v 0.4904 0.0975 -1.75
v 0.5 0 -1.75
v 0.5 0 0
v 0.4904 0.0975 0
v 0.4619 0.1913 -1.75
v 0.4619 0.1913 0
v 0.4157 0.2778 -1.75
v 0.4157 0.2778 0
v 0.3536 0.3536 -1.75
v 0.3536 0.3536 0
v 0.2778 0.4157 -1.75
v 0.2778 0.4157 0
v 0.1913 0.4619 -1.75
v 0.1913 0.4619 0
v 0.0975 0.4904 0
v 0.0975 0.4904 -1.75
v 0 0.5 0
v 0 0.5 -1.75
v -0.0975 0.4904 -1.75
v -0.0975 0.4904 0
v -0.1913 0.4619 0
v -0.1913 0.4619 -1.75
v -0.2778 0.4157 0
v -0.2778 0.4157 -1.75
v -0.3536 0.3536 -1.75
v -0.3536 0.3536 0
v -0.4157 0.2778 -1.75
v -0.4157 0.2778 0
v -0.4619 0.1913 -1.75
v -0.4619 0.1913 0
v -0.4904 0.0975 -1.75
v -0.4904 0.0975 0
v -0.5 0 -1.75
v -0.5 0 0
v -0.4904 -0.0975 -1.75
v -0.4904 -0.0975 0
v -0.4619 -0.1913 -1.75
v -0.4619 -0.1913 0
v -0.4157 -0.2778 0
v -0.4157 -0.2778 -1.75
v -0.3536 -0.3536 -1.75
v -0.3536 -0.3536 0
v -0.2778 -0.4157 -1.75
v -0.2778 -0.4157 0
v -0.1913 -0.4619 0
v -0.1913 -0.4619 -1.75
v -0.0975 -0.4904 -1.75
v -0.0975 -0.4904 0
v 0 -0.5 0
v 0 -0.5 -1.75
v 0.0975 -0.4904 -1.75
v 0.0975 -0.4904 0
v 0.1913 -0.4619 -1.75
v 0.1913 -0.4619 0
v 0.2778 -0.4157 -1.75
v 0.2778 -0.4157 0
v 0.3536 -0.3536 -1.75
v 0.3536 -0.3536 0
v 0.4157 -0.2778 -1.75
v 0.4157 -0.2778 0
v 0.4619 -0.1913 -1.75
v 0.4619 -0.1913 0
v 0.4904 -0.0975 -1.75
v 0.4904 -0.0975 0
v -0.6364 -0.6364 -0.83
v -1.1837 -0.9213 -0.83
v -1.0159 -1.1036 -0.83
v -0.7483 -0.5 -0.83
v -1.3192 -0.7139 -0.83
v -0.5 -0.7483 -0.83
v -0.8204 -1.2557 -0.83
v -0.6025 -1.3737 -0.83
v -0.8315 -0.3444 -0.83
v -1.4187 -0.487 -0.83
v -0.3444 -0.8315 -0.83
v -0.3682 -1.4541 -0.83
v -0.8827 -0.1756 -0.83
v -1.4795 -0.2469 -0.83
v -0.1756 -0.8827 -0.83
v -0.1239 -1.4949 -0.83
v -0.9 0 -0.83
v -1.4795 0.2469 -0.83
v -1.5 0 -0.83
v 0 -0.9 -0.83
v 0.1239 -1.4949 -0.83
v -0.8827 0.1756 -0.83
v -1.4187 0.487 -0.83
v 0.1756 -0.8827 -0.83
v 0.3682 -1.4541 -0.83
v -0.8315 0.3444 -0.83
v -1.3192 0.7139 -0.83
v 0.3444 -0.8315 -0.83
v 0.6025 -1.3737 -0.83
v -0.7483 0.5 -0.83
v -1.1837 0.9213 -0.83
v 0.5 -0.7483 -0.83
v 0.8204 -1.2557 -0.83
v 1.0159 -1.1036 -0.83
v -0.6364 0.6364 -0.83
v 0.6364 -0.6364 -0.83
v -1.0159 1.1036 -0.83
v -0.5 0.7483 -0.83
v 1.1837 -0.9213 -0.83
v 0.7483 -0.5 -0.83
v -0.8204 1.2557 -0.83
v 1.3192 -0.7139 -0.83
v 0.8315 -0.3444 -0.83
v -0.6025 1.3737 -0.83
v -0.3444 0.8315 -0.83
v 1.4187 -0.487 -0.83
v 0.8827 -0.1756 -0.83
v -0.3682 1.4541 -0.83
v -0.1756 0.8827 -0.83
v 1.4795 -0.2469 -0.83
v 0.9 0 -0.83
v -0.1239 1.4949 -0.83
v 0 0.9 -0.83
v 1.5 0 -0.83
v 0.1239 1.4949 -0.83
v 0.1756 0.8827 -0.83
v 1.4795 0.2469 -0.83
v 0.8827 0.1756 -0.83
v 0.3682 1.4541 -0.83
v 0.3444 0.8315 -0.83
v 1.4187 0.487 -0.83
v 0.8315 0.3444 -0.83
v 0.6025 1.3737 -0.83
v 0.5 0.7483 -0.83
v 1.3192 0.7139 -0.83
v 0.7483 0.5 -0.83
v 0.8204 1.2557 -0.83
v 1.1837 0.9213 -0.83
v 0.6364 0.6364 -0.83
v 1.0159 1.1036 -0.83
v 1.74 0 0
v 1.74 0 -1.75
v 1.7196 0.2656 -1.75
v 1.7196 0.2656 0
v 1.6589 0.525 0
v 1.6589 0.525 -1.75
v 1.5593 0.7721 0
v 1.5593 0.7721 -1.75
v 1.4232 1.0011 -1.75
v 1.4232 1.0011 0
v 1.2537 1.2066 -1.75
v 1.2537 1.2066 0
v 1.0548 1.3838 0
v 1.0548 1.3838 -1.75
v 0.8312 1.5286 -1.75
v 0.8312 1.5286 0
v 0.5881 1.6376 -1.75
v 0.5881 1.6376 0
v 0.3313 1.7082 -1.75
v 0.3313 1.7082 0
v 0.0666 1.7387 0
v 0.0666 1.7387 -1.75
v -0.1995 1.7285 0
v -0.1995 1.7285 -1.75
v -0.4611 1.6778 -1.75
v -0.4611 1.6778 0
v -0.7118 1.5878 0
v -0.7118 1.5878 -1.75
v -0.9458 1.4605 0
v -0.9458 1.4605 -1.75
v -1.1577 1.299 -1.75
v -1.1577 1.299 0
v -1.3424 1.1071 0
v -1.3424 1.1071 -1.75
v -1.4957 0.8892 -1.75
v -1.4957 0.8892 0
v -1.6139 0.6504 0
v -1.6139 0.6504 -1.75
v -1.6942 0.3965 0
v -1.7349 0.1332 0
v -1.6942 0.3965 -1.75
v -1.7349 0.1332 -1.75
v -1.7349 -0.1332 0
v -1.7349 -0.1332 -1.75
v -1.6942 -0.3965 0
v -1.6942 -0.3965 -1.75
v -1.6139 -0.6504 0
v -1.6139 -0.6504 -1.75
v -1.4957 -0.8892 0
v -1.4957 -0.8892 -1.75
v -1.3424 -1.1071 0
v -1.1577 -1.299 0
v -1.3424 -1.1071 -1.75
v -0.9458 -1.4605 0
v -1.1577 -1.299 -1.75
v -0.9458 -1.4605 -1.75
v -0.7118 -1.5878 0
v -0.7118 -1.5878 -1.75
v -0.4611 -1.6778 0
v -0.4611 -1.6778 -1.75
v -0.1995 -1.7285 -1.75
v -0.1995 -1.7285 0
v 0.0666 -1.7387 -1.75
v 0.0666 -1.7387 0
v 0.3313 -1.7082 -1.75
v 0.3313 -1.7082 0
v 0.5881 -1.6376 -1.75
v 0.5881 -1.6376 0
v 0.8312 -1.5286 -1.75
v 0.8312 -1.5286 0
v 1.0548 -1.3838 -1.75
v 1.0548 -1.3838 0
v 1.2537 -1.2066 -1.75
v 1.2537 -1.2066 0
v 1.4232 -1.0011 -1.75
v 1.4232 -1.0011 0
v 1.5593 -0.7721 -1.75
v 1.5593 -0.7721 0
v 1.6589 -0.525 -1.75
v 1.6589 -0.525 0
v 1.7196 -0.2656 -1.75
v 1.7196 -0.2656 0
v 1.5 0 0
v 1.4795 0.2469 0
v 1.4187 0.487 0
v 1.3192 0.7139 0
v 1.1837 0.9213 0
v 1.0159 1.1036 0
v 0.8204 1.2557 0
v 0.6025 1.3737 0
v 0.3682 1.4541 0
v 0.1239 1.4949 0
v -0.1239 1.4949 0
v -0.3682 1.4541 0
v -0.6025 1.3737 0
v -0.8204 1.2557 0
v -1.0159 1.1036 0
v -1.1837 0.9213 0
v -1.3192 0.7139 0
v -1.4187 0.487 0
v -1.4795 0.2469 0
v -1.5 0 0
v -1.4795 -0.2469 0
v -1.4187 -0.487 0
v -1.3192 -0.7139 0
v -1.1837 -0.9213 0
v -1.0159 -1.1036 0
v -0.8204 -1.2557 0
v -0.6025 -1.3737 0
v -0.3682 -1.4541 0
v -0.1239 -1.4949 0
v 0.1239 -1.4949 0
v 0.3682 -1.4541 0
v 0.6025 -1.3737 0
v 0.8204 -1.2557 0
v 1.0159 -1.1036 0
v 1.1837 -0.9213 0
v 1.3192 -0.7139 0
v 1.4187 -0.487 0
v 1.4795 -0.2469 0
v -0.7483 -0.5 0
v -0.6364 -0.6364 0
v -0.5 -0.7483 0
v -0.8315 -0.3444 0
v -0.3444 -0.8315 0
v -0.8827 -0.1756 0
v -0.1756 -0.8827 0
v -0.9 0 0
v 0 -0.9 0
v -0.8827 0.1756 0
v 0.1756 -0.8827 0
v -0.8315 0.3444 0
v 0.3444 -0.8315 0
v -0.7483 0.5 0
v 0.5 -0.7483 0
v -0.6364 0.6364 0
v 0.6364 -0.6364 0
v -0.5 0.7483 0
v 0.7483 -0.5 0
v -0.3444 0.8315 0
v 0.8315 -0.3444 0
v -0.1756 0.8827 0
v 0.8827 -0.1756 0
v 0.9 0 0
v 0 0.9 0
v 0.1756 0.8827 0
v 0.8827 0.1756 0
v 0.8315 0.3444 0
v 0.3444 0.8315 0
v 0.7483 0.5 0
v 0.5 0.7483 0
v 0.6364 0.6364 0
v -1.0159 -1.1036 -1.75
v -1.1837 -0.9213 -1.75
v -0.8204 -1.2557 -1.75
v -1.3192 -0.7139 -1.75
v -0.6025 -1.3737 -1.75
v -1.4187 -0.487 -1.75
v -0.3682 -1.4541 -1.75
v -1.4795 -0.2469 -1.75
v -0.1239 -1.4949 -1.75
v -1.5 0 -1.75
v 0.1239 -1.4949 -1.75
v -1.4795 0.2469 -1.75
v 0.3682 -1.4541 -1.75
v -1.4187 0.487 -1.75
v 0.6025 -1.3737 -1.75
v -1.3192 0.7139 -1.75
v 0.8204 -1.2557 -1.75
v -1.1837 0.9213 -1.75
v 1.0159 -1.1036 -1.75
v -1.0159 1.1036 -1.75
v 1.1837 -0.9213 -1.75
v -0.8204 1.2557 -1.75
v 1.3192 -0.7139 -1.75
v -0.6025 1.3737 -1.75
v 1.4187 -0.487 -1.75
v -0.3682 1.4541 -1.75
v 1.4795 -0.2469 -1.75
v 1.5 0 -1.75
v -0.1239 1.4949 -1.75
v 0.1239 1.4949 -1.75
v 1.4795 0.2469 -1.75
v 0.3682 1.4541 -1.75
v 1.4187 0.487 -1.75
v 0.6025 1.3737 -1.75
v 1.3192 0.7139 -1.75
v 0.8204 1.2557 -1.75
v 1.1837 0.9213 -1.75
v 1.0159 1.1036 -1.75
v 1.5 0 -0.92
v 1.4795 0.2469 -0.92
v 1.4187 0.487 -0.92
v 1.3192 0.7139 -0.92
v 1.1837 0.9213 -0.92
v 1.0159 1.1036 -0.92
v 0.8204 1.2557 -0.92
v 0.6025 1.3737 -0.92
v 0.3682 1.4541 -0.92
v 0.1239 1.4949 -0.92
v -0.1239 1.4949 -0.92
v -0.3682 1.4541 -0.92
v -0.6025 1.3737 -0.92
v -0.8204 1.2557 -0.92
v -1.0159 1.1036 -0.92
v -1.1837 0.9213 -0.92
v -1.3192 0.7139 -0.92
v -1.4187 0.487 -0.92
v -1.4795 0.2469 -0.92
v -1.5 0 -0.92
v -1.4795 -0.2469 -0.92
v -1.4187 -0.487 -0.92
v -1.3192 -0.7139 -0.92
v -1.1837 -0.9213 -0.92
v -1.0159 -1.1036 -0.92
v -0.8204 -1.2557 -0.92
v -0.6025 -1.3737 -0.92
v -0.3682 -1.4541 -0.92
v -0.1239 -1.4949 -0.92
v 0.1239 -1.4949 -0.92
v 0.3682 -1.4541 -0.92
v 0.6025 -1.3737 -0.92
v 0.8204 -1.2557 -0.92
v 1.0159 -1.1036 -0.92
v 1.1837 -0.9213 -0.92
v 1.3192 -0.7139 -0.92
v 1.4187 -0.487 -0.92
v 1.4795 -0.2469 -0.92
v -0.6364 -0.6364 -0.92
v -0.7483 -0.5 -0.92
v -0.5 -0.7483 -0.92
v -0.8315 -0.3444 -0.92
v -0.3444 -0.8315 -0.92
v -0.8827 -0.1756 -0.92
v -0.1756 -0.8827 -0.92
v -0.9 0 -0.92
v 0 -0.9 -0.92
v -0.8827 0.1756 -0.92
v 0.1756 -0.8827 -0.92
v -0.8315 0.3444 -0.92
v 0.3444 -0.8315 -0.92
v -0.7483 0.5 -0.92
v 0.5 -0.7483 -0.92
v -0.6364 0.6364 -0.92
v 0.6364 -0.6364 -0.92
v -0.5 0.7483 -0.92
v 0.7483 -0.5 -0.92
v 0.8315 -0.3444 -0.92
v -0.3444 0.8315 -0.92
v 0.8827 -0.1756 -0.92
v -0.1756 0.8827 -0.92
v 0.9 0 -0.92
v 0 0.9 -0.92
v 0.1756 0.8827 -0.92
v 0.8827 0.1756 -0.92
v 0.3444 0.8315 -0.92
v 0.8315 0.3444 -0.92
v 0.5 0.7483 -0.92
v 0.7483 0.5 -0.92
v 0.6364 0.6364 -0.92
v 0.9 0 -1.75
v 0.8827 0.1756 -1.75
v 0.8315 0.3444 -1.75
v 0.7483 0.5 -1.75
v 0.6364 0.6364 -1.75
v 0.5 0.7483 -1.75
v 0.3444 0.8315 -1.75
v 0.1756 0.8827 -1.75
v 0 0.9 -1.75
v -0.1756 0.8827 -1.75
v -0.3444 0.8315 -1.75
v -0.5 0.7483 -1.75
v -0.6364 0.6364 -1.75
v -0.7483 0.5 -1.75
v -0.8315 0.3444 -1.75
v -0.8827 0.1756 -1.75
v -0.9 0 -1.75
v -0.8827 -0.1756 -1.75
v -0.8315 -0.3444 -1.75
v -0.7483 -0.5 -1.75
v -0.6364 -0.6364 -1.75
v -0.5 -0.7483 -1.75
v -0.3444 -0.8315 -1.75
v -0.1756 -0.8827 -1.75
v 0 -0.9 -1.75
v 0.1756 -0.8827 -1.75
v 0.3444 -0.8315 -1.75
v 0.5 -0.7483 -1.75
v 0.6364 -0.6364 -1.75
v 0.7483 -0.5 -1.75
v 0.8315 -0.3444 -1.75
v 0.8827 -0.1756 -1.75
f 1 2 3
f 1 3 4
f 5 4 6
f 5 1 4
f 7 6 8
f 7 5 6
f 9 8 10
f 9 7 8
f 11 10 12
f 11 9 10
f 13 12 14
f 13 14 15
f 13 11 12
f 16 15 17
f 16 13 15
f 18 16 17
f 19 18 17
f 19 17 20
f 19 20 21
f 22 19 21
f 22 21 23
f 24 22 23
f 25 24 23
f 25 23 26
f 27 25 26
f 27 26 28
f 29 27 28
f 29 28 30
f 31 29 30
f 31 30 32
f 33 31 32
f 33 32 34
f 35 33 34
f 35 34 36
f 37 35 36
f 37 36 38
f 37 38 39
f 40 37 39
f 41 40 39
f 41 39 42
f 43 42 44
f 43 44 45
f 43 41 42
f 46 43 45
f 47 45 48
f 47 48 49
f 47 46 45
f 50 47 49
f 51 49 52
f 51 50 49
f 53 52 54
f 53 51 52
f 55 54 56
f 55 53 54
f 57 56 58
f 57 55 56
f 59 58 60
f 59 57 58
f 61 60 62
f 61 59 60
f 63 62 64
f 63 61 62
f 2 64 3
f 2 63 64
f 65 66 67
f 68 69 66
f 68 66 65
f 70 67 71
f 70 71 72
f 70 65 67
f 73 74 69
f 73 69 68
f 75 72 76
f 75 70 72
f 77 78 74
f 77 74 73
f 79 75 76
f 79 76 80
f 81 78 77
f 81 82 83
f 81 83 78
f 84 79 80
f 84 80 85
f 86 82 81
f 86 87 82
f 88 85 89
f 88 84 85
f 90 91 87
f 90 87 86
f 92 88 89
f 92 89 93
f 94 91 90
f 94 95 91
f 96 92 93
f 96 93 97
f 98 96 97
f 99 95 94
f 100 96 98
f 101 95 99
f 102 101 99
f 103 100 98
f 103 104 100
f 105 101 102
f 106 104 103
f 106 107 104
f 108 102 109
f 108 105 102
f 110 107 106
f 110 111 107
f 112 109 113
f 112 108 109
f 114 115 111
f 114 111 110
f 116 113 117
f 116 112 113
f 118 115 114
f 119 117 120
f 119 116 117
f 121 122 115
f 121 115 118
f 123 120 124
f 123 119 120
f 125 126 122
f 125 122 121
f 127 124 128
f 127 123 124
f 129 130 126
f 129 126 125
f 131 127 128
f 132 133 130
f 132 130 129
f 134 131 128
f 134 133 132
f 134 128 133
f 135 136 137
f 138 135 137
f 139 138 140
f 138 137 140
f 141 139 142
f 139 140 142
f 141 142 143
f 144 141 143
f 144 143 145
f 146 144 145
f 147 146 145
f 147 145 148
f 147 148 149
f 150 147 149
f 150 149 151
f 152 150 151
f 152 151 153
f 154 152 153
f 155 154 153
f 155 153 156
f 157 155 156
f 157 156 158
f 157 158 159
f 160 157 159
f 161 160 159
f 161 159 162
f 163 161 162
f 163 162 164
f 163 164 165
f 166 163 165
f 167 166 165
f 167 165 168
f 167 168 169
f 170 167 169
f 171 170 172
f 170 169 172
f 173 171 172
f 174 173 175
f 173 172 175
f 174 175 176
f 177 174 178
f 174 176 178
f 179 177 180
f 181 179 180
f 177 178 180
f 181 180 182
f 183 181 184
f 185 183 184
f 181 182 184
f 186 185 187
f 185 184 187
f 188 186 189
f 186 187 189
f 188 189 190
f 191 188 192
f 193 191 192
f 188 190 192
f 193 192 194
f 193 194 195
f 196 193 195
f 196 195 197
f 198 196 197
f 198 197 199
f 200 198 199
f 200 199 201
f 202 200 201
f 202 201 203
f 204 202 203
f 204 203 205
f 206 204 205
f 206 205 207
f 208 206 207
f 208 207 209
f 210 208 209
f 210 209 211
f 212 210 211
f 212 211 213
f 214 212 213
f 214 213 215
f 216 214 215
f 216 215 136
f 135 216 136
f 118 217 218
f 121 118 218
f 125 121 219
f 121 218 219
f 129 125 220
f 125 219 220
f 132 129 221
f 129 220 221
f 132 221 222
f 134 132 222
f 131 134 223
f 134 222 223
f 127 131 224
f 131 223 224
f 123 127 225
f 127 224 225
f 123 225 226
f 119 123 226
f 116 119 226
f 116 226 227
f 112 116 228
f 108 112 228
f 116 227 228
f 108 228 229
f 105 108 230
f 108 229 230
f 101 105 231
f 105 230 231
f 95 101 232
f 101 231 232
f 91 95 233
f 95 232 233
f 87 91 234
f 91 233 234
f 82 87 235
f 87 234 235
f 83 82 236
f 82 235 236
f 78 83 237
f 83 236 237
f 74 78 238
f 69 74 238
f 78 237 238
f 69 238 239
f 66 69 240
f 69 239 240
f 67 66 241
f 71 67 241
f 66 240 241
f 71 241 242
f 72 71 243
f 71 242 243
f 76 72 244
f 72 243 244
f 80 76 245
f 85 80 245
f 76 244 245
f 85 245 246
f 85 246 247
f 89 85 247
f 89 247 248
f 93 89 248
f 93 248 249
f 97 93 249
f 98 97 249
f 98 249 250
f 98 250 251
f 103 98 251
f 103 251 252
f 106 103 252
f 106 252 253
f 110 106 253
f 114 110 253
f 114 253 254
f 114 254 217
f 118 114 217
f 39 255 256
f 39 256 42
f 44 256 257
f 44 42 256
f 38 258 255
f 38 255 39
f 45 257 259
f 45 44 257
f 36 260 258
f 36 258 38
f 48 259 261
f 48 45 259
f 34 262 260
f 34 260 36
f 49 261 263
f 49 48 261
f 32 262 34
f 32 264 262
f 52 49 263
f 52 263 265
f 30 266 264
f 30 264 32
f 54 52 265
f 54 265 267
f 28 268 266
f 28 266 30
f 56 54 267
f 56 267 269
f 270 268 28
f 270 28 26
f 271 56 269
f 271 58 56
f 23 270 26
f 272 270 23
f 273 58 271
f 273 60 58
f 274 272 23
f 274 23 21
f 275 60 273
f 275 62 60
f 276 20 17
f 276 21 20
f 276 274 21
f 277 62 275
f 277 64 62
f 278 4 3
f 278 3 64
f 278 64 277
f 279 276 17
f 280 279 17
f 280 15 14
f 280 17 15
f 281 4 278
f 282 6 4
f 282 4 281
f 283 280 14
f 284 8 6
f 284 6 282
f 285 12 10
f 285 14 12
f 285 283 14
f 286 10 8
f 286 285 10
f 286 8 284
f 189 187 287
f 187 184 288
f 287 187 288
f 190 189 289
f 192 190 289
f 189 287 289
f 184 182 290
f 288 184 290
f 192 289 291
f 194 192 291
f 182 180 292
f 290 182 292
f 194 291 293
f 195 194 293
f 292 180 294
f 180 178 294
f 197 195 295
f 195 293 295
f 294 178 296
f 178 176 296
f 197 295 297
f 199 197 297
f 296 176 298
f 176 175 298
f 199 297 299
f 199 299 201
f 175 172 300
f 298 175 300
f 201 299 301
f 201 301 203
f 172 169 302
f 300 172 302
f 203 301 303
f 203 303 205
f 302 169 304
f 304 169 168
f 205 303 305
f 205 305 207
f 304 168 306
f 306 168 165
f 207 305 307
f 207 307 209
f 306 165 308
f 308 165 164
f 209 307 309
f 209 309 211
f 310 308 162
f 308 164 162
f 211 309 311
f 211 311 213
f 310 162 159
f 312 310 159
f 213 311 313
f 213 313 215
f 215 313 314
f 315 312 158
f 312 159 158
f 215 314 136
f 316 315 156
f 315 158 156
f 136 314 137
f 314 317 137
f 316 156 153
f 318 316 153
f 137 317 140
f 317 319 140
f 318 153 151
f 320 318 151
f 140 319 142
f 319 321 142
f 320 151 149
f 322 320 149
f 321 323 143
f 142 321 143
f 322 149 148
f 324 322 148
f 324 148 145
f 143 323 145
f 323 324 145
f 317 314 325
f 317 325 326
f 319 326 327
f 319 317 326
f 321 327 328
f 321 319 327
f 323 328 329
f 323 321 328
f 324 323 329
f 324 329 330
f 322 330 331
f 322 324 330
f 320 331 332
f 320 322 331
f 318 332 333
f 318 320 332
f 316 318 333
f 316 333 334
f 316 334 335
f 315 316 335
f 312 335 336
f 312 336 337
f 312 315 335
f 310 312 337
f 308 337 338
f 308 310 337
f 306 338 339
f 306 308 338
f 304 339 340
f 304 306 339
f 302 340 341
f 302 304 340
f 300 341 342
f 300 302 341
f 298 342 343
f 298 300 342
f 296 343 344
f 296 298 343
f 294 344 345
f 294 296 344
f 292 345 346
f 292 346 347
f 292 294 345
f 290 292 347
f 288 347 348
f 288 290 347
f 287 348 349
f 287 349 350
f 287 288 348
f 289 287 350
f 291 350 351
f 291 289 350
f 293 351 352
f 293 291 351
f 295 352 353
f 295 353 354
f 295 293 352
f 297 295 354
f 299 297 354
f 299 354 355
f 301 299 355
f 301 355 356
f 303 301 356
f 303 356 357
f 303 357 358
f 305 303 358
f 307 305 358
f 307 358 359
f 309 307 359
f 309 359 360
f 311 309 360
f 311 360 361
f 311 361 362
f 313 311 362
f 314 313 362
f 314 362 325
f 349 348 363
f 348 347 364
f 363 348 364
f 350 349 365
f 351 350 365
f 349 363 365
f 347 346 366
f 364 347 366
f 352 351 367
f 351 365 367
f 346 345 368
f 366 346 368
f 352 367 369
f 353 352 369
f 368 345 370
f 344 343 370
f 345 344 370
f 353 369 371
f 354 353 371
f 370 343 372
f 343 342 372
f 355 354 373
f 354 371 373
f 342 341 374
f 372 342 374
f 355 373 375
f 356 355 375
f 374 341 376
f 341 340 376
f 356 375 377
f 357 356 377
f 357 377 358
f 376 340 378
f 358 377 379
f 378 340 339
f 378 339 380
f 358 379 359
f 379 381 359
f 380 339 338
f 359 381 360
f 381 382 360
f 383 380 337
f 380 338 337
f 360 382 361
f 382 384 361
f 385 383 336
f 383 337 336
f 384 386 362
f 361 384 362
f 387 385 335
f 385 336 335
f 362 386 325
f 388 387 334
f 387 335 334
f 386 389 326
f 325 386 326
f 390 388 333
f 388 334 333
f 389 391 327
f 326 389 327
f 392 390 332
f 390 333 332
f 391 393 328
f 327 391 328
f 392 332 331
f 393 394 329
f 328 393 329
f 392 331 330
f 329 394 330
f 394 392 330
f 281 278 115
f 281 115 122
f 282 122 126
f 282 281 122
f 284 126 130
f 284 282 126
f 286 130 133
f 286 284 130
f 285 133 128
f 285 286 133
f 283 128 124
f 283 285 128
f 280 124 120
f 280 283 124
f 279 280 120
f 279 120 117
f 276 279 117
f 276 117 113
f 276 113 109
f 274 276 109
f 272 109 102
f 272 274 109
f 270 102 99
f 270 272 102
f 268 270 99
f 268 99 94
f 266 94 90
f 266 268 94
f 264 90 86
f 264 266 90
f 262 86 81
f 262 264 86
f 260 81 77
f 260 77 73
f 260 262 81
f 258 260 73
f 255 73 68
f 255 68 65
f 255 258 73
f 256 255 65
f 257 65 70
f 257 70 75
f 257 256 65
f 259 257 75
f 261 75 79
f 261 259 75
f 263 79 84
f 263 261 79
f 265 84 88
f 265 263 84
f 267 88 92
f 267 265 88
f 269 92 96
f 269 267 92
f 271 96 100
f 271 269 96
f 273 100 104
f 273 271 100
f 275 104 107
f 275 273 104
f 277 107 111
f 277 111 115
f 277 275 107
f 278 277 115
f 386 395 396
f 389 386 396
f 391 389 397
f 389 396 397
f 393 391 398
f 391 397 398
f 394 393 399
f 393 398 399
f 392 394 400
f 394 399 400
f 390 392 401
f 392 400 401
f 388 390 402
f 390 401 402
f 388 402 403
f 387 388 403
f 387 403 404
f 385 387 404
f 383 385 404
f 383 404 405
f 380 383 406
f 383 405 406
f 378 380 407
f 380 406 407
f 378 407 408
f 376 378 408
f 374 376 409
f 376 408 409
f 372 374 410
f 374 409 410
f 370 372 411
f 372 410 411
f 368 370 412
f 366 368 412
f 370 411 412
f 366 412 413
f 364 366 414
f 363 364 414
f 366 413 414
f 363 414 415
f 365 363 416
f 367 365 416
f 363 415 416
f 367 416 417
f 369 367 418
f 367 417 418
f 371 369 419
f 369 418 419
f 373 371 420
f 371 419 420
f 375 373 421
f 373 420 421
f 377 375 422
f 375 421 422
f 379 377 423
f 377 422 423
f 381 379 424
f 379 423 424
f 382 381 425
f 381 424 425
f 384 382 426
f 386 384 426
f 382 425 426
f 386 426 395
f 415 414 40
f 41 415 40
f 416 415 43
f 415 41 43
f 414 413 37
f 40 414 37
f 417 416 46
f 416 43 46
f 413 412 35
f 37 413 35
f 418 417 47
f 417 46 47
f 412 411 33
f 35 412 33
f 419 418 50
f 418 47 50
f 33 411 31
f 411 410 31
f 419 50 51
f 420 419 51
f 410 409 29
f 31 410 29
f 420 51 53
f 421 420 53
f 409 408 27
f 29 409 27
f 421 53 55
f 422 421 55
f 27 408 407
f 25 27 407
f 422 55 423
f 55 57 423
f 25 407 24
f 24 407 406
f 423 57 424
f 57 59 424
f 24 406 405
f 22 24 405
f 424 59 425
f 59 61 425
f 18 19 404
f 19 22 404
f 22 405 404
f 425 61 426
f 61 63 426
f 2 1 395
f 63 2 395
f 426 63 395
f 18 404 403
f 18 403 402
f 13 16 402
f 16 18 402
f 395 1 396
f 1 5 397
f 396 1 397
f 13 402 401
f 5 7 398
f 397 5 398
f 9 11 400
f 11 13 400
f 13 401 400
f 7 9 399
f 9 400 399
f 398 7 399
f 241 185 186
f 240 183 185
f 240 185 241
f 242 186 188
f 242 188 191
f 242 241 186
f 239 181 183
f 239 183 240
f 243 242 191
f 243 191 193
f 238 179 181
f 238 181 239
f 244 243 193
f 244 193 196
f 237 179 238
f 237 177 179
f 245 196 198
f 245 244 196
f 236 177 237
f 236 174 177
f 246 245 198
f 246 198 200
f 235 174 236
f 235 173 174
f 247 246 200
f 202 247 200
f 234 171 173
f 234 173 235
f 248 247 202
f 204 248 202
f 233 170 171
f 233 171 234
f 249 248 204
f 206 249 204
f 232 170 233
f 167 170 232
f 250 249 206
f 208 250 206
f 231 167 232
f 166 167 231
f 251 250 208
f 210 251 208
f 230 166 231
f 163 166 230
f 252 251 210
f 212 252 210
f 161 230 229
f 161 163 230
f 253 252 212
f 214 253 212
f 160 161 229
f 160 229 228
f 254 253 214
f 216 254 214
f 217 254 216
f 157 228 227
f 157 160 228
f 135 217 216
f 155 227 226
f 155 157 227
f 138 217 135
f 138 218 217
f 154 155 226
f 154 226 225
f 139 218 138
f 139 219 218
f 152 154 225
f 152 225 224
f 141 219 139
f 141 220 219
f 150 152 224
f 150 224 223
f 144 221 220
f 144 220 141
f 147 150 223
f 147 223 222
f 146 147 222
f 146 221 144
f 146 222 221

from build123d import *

# Parameters (mm, degrees)
SKETCH1_R           = 1.74
BOSS_EXTRUDE1_DEPTH = 0.875
SKETCH2_R           = 0.5
CUT_EXTRUDE1_DEPTH  = 1.875
SKETCH3_R           = 1.5
SKETCH3_R_2         = 0.9
CUT_EXTRUDE2_DEPTH  = 0.83


with BuildPart() as part:
    # Sketch1 → Boss-Extrude1 (new body)
    with BuildSketch(Plane.XY):
        Circle(SKETCH1_R)
    extrude(amount=-BOSS_EXTRUDE1_DEPTH)

    # Sketch2 → Cut-Extrude1 (cut, through all)
    with BuildSketch(Plane.XY):
        Circle(SKETCH2_R)
    extrude(amount=-CUT_EXTRUDE1_DEPTH, mode=Mode.SUBTRACT)

    # Sketch3 → Cut-Extrude2 (cut)
    with BuildSketch(Plane.XY):
        Circle(SKETCH3_R)
        Circle(SKETCH3_R_2, mode=Mode.SUBTRACT)
    extrude(amount=-CUT_EXTRUDE2_DEPTH, mode=Mode.SUBTRACT)

    # Mirror3: part across plane


with BuildPart() as part_1:
    add(part.part)
    add(part.part.mirror(Plane.XY.offset(-0.875)))


solid = part_1.part
